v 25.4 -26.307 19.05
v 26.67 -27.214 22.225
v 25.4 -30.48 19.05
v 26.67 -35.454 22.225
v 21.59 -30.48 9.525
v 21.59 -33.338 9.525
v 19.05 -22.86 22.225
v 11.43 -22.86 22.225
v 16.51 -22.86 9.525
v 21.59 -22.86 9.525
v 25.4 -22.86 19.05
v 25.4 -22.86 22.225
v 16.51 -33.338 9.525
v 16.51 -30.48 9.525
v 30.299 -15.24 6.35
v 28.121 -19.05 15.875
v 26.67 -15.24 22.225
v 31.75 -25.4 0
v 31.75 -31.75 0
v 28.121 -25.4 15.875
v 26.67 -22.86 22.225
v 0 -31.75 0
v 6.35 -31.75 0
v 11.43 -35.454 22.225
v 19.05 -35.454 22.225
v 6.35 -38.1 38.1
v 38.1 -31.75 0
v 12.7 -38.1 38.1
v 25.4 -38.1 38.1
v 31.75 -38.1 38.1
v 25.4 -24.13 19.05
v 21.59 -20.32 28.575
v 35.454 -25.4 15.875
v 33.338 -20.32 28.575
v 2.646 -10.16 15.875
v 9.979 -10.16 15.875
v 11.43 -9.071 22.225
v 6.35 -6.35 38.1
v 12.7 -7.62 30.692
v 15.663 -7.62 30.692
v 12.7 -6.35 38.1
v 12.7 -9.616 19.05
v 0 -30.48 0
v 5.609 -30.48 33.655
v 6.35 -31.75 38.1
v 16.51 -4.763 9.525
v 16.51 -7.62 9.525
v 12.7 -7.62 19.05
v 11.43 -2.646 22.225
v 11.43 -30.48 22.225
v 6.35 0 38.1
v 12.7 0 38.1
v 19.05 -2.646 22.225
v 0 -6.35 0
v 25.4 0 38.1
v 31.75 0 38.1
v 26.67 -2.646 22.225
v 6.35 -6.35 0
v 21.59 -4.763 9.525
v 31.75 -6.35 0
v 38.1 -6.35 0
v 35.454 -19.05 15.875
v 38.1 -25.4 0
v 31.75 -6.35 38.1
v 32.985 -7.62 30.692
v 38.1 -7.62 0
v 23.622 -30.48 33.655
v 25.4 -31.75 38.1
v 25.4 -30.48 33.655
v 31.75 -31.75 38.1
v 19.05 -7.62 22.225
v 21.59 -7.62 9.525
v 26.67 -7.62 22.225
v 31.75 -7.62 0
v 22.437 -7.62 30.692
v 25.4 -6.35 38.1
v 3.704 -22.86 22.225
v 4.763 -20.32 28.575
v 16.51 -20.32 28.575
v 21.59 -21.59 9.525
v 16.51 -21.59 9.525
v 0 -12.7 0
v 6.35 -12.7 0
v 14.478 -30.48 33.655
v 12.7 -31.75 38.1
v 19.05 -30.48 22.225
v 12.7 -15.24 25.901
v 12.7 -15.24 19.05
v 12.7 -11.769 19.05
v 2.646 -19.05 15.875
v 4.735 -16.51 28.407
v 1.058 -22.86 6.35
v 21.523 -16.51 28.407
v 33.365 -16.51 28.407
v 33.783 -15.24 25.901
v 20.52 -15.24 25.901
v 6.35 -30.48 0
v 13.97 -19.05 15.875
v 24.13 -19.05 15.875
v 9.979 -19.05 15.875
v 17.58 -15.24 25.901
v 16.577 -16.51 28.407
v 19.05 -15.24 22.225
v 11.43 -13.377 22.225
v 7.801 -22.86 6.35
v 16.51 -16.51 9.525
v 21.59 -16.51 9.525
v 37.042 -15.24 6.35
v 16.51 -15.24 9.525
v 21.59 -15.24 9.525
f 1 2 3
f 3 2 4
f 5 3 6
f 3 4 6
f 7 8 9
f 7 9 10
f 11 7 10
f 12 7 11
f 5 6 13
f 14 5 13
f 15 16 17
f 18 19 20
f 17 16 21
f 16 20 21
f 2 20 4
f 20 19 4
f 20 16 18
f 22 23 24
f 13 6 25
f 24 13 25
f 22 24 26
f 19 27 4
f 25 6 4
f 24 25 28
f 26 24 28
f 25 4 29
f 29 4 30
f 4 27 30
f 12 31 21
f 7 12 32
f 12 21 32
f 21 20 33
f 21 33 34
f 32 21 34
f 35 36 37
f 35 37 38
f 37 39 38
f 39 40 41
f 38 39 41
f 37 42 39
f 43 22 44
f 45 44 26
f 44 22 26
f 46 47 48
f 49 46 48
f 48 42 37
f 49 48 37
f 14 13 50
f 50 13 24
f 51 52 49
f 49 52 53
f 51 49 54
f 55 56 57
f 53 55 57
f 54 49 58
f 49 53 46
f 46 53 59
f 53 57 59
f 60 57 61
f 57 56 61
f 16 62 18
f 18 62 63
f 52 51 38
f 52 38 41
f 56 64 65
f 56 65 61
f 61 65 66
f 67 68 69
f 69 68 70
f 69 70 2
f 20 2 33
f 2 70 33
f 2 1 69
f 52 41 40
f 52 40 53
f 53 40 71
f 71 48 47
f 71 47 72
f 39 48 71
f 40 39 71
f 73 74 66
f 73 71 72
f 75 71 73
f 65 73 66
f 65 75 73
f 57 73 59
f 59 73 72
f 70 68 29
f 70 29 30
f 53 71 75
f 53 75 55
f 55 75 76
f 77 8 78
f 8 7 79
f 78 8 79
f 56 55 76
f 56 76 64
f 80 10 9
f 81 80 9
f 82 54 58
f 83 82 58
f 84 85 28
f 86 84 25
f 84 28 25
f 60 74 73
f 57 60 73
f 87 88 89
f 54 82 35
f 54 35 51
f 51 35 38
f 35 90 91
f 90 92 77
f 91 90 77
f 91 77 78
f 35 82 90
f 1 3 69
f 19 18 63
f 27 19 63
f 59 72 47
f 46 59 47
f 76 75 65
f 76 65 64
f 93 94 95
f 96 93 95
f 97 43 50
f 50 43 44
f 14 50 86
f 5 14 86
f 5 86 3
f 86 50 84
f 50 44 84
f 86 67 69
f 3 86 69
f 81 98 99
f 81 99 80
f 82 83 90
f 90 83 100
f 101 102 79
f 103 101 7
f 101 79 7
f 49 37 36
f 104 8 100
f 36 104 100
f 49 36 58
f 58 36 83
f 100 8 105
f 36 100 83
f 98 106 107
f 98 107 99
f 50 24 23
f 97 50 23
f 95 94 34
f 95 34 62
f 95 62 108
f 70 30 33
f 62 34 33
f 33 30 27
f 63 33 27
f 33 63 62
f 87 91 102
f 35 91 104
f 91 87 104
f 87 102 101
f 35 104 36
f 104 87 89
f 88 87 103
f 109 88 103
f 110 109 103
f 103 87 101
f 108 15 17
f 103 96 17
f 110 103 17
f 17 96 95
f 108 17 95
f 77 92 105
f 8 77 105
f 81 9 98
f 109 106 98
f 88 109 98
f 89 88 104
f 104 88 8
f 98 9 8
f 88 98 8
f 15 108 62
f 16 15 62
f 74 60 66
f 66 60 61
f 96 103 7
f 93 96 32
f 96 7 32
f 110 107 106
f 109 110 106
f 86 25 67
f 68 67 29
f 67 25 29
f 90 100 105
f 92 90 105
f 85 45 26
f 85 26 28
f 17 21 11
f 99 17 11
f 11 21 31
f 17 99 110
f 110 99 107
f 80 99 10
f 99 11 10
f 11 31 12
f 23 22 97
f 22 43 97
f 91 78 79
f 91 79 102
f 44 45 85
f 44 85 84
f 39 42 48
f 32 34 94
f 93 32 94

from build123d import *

# Parameters (mm, degrees)
F0_W      = 38.1
F0_H      = 38.1
F1_DEPTH  = 38.1
F6_DEPTH  = 38.1
F8_DEPTH  = 38.1
F9_W      = 25.4
F9_H      = 7.62
F10_DEPTH = 38.1


with BuildPart() as f1:
    # F0 (on Front) → F1 (new body)
    with BuildSketch(Plane.XZ):
        with Locations((19.05, 19.05)):
            Rectangle(F0_W, F0_H)
    extrude(amount=F1_DEPTH)

    # F5 (on offset) → F6 (cut)
    with BuildSketch(Plane.YZ.offset(38.1)):
        Polygon((-31.75, 0), (-38.1, 38.1), (-38.1, 0), align=None)
        Polygon((-19.05, 15.875), (-25.4, 0), (-12.7, 0), align=None)
        Polygon((0, 38.1), (-6.35, 0), (0, 0), align=None)
        Polygon((-6.35, 38.1), (-16.51, 38.1), (-16.51, 28.40746), (-10.16, 15.875), align=None)
        Polygon((-21.59, 38.1), (-31.75, 38.1), (-25.4, 15.875), (-20.336536, 28.53366), (-21.59, 28.575), align=None)
        Polygon((-16.51, 38.1), (-21.59, 38.1), (-21.59, 28.575), (-20.336536, 28.53366), (-20.32, 28.575), (-16.51, 28.40746), align=None)
    extrude(amount=-F6_DEPTH, mode=Mode.SUBTRACT)

    # F7 (on offset) → F8 (cut)
    with BuildSketch(Plane.XZ.offset(38.1)):
        Polygon((31.75, 38.1), (38.1, 0), (38.1, 38.1), align=None)
        Polygon((25.4, 38.1), (12.7, 38.1), (19.05, 22.225), align=None)
        Polygon((0, 38.1), (0, 0), (6.35, 38.1), align=None)
        Polygon((11.43, 22.225), (6.35, 0), (31.75, 0), (26.67, 22.225), (21.59, 9.525), (16.51, 9.525), align=None)
    extrude(amount=-F8_DEPTH, mode=Mode.SUBTRACT)

    # F9 (on offset) → F10 (cut)
    with BuildSketch(Plane.XY.offset(38.1)):
        with Locations((25.4, -11.43)):
            Rectangle(F9_W, F9_H)
        with Locations((12.7, -26.67)):
            Rectangle(F9_W, F9_H)
    extrude(amount=-F10_DEPTH, mode=Mode.SUBTRACT)


solid = f1.part
